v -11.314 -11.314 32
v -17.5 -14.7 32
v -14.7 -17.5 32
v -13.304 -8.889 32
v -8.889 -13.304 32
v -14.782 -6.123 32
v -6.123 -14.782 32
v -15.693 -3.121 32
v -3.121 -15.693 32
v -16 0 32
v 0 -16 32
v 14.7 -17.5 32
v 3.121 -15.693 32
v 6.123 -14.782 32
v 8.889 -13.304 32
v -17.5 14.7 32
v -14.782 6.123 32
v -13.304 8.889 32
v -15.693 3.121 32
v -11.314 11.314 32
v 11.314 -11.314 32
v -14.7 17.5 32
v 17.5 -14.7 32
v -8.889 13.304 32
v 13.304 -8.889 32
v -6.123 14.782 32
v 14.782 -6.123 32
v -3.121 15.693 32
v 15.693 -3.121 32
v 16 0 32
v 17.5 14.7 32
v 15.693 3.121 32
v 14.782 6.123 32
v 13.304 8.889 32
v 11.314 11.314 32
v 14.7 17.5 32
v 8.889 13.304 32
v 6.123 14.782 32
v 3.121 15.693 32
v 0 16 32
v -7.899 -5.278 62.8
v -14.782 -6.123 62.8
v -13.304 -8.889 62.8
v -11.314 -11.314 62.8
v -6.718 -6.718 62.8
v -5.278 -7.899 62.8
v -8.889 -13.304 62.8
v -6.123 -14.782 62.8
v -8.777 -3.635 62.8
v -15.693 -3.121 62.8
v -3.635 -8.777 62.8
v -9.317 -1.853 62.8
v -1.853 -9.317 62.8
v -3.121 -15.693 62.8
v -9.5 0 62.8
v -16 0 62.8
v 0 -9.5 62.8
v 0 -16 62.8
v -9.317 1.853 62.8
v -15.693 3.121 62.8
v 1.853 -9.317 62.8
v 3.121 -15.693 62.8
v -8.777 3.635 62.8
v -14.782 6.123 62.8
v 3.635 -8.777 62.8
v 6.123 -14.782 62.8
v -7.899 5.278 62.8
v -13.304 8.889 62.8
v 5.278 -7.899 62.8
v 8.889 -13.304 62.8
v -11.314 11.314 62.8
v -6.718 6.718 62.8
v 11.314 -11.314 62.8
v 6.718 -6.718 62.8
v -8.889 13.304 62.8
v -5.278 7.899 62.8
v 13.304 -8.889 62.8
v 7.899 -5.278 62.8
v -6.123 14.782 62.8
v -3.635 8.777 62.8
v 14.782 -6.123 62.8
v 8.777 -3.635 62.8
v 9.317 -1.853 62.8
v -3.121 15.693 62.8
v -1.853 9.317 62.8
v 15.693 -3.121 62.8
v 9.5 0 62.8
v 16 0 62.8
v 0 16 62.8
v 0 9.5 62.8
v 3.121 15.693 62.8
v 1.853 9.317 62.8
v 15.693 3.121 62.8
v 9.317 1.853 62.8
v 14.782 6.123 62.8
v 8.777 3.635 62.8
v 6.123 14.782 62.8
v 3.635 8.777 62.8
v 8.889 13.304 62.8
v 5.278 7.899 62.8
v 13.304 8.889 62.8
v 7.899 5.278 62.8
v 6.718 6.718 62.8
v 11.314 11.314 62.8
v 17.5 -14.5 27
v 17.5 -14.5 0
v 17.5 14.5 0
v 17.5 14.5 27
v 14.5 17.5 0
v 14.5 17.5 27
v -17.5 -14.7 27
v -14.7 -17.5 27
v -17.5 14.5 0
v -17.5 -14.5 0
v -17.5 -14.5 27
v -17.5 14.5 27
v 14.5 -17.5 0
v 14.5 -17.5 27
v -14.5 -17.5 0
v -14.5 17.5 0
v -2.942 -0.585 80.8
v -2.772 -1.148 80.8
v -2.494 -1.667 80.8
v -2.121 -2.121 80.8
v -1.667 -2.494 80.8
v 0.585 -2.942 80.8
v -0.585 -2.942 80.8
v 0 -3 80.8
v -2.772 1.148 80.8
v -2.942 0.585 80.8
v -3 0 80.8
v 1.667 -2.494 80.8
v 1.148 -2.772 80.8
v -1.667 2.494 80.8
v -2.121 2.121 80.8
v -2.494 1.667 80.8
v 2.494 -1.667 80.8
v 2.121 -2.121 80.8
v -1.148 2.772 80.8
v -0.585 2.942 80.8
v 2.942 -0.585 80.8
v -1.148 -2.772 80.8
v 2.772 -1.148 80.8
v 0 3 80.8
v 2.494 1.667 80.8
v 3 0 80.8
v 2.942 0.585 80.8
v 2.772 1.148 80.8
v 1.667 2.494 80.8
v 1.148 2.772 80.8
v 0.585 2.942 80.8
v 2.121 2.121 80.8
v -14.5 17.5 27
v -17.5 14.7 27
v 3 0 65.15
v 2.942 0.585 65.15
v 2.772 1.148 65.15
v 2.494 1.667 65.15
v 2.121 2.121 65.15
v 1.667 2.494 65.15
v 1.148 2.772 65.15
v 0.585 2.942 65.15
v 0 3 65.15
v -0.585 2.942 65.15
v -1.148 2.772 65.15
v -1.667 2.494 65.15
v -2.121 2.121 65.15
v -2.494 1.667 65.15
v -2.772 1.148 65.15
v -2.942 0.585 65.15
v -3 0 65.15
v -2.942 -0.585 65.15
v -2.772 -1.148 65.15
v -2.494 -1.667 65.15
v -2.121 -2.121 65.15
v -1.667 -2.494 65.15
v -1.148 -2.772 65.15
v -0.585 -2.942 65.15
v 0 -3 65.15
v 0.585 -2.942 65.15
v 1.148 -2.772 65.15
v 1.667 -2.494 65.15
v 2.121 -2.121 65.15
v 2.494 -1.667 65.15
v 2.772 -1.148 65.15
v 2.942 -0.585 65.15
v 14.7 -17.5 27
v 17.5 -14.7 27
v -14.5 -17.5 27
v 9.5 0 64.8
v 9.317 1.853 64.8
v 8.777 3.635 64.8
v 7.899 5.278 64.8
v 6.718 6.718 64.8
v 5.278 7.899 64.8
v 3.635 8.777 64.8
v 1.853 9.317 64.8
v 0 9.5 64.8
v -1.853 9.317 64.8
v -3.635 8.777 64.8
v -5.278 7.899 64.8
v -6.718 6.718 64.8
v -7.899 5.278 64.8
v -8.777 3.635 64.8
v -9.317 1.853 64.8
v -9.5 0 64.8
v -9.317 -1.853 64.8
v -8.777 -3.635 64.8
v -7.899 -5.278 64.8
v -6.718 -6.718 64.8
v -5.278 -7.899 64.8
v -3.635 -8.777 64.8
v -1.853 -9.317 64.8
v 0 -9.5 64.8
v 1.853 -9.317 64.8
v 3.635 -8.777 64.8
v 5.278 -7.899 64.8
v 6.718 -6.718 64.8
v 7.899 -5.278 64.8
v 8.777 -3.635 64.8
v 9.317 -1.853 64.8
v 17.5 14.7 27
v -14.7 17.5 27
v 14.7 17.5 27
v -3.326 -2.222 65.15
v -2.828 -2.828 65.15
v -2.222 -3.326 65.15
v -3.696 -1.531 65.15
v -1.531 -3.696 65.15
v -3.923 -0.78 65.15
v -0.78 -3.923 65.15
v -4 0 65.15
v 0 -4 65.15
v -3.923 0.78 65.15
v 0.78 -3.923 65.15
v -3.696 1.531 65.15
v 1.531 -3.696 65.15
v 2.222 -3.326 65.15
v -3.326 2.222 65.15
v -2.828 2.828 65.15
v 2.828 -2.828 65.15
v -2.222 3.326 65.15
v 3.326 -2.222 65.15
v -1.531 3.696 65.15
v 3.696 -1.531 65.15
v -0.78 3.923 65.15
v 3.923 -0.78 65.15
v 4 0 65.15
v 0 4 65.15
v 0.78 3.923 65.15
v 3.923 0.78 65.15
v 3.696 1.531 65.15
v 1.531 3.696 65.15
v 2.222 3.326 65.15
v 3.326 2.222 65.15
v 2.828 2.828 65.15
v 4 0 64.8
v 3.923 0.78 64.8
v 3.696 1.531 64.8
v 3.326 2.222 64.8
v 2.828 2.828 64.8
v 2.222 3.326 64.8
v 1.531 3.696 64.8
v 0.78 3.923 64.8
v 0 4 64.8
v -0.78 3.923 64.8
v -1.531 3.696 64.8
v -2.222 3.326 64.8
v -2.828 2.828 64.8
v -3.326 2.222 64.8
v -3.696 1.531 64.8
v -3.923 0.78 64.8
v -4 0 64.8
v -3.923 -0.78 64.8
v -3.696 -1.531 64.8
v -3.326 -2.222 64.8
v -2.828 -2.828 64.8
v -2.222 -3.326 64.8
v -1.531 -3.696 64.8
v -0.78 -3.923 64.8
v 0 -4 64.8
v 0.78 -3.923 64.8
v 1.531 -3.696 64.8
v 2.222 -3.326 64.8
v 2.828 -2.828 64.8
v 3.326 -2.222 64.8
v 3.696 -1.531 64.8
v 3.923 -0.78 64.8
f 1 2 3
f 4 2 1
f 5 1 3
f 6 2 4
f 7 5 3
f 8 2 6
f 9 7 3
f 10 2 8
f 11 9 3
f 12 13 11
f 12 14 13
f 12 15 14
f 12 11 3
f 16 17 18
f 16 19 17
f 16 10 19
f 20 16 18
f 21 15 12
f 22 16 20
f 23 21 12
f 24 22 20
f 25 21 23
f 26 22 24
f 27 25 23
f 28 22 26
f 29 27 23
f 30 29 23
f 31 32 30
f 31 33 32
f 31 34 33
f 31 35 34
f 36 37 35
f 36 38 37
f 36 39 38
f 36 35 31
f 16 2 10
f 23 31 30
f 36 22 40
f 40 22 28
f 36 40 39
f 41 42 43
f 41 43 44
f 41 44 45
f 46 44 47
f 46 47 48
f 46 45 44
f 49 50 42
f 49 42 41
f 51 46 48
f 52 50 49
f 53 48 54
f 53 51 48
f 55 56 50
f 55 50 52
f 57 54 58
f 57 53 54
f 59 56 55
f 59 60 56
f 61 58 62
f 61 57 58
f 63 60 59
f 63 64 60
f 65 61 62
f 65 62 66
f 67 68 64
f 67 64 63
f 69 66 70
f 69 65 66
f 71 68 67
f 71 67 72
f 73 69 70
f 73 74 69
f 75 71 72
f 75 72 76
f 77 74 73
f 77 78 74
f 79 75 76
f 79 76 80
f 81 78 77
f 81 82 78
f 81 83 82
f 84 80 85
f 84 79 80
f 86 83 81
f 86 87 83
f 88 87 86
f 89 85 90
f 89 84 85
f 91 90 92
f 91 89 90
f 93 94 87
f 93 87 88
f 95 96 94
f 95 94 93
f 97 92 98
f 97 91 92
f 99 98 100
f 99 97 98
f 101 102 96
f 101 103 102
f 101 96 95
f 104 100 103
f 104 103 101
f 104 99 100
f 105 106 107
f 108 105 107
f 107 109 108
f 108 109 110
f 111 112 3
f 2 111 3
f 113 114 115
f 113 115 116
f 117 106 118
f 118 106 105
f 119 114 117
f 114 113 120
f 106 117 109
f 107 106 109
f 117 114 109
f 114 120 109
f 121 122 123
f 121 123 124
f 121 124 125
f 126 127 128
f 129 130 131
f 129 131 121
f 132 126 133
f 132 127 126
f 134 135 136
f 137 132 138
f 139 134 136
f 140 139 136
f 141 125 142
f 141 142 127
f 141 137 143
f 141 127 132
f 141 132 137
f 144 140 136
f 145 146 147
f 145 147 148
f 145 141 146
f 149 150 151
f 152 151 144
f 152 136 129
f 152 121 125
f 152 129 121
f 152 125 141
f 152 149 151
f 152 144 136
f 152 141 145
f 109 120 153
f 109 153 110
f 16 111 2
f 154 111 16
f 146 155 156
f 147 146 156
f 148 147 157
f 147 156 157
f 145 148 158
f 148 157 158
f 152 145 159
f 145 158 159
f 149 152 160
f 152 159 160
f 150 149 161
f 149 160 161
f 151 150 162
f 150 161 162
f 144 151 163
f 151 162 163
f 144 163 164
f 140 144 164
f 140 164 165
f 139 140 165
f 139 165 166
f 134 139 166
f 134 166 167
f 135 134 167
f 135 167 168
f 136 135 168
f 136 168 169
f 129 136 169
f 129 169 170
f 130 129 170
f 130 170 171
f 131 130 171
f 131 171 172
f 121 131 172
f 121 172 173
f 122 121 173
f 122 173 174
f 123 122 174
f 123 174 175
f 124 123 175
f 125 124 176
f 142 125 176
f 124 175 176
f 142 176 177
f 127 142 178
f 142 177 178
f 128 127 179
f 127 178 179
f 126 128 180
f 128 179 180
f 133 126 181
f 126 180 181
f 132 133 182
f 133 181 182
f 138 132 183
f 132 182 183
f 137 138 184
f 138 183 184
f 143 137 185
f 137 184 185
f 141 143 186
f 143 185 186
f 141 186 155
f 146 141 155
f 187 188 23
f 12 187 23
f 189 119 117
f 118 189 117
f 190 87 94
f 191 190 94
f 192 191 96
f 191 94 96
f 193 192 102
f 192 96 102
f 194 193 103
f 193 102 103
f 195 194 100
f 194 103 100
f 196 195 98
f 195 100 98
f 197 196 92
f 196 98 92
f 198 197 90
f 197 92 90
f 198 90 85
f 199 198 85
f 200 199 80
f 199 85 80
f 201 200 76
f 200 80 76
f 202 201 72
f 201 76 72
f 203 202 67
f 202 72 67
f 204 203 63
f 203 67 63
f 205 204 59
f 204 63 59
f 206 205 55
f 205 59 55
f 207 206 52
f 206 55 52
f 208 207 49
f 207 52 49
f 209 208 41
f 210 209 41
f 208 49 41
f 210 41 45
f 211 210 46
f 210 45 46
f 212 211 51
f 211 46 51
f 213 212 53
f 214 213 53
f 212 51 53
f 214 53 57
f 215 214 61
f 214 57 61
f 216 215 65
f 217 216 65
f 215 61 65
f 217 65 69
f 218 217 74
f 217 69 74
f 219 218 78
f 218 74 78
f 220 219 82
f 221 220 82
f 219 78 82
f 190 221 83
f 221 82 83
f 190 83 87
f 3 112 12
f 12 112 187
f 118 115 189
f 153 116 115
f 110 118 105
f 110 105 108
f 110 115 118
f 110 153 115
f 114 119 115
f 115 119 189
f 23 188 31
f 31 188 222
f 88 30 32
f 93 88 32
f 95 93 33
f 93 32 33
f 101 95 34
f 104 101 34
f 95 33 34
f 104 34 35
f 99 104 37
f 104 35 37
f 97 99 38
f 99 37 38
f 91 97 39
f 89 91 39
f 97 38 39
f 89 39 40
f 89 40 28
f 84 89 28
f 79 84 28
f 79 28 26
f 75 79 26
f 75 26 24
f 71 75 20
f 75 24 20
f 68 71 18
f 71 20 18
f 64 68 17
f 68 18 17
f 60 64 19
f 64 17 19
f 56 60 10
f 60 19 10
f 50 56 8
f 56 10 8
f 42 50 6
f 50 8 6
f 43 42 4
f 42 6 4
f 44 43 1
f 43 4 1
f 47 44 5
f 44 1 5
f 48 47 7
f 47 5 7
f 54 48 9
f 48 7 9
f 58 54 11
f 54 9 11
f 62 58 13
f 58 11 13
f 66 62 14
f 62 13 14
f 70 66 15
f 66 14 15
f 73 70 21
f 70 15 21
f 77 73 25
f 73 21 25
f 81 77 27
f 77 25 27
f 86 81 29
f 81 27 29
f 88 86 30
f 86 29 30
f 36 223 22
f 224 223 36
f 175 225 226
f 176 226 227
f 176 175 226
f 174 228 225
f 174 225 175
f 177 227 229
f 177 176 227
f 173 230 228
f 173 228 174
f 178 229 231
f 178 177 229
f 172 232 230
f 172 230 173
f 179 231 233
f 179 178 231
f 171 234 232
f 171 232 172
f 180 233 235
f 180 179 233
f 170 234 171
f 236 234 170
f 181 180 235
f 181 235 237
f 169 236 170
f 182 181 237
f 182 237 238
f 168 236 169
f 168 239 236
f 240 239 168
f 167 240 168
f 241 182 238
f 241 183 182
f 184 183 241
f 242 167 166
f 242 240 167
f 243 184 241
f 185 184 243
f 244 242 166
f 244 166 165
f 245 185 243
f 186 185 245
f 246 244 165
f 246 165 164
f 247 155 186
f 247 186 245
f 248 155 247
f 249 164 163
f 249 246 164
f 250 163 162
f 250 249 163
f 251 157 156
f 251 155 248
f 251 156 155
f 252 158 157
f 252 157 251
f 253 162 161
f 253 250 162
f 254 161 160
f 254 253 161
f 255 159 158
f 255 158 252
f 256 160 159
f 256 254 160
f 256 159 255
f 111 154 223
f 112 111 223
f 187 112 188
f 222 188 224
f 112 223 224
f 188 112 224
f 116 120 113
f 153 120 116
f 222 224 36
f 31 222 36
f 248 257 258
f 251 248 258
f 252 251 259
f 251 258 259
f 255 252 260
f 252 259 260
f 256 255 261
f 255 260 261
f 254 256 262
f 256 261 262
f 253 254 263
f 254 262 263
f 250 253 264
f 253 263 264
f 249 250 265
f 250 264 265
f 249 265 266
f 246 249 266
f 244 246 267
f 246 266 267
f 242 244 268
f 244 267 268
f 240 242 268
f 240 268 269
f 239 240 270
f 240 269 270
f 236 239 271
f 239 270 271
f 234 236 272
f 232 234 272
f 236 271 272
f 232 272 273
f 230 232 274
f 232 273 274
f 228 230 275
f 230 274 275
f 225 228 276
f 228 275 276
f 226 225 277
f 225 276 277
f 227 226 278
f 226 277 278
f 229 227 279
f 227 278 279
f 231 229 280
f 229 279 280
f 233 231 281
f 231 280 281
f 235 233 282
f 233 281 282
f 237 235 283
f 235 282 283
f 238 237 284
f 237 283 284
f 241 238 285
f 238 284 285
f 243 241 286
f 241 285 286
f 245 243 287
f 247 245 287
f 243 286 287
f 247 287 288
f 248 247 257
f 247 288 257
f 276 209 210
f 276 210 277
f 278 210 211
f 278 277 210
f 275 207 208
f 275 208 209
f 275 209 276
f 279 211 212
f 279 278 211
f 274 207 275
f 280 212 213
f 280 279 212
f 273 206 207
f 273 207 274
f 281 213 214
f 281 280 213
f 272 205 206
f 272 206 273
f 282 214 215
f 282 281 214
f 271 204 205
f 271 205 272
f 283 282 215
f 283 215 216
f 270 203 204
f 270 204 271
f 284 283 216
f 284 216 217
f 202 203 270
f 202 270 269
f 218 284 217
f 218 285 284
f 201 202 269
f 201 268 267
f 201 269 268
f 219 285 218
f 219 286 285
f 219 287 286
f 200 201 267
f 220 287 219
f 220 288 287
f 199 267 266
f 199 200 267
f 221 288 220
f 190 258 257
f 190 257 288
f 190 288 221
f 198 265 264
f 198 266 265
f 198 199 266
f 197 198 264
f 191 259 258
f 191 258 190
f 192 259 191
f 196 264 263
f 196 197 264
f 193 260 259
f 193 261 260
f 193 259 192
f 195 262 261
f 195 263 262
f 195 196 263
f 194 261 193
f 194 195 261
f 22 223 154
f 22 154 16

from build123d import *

# Parameters (mm, degrees)
SKETCH1_W           = 35
SKETCH1_H           = 35
BOSS_EXTRUDE1_DEPTH = 27
CHAMFER1_SIZE       = 3
SKETCH2_W           = 35
SKETCH2_H           = 35
BOSS_EXTRUDE2_DEPTH = 5
CHAMFER2_SIZE       = 2.8
SKETCH3_R           = 16
BOSS_EXTRUDE3_DEPTH = 30.8
SKETCH4_R           = 9.5
BOSS_EXTRUDE4_DEPTH = 2
SKETCH6_R           = 3
BOSS_EXTRUDE5_DEPTH = 18
SKETCH7_R           = 4
BOSS_EXTRUDE6_DEPTH = 0.35


with BuildPart() as part:
    # Sketch1 → Boss-Extrude1 (new body)
    with BuildSketch(Plane.XY):
        Rectangle(SKETCH1_W, SKETCH1_H)
    extrude(amount=BOSS_EXTRUDE1_DEPTH)

    # Chamfer1
    chamfer1_edges = [part.edges().sort_by_distance(p)[0] for p in [
        (17.5, -17.5, 13.5),
        (-17.5, -17.5, 13.5),
        (-17.5, 17.5, 13.5),
        (17.5, 17.5, 13.5),
    ]]
    chamfer(chamfer1_edges, length=CHAMFER1_SIZE)


with BuildPart() as body_2:
    # Sketch2 → Boss-Extrude2 (new body)
    with BuildSketch(Plane.XY.offset(27)):
        Rectangle(SKETCH2_W, SKETCH2_H)
    extrude(amount=BOSS_EXTRUDE2_DEPTH)

    # Chamfer2
    chamfer2_edges = [body_2.edges().sort_by_distance(p)[0] for p in [
        (17.5, -17.5, 29.5),
        (-17.5, -17.5, 29.5),
        (-17.5, 17.5, 29.5),
        (17.5, 17.5, 29.5),
    ]]
    chamfer(chamfer2_edges, length=CHAMFER2_SIZE)

    # Sketch3 → Boss-Extrude3 (add)
    with BuildSketch(Plane.XY.offset(32)):
        Circle(SKETCH3_R)
    extrude(amount=BOSS_EXTRUDE3_DEPTH)

    # Sketch4 → Boss-Extrude4 (add)
    with BuildSketch(Plane.XY.offset(62.8)):
        Circle(SKETCH4_R)
    extrude(amount=BOSS_EXTRUDE4_DEPTH)

    # Sketch6 → Boss-Extrude5 (add)
    with BuildSketch(Plane.XY.offset(62.8)):
        Circle(SKETCH6_R)
    extrude(amount=BOSS_EXTRUDE5_DEPTH)

    # Sketch7 → Boss-Extrude6 (add)
    with BuildSketch(Plane.XY.offset(64.8)):
        Circle(SKETCH7_R)
    extrude(amount=BOSS_EXTRUDE6_DEPTH)


solid = Compound([part.part, body_2.part])
